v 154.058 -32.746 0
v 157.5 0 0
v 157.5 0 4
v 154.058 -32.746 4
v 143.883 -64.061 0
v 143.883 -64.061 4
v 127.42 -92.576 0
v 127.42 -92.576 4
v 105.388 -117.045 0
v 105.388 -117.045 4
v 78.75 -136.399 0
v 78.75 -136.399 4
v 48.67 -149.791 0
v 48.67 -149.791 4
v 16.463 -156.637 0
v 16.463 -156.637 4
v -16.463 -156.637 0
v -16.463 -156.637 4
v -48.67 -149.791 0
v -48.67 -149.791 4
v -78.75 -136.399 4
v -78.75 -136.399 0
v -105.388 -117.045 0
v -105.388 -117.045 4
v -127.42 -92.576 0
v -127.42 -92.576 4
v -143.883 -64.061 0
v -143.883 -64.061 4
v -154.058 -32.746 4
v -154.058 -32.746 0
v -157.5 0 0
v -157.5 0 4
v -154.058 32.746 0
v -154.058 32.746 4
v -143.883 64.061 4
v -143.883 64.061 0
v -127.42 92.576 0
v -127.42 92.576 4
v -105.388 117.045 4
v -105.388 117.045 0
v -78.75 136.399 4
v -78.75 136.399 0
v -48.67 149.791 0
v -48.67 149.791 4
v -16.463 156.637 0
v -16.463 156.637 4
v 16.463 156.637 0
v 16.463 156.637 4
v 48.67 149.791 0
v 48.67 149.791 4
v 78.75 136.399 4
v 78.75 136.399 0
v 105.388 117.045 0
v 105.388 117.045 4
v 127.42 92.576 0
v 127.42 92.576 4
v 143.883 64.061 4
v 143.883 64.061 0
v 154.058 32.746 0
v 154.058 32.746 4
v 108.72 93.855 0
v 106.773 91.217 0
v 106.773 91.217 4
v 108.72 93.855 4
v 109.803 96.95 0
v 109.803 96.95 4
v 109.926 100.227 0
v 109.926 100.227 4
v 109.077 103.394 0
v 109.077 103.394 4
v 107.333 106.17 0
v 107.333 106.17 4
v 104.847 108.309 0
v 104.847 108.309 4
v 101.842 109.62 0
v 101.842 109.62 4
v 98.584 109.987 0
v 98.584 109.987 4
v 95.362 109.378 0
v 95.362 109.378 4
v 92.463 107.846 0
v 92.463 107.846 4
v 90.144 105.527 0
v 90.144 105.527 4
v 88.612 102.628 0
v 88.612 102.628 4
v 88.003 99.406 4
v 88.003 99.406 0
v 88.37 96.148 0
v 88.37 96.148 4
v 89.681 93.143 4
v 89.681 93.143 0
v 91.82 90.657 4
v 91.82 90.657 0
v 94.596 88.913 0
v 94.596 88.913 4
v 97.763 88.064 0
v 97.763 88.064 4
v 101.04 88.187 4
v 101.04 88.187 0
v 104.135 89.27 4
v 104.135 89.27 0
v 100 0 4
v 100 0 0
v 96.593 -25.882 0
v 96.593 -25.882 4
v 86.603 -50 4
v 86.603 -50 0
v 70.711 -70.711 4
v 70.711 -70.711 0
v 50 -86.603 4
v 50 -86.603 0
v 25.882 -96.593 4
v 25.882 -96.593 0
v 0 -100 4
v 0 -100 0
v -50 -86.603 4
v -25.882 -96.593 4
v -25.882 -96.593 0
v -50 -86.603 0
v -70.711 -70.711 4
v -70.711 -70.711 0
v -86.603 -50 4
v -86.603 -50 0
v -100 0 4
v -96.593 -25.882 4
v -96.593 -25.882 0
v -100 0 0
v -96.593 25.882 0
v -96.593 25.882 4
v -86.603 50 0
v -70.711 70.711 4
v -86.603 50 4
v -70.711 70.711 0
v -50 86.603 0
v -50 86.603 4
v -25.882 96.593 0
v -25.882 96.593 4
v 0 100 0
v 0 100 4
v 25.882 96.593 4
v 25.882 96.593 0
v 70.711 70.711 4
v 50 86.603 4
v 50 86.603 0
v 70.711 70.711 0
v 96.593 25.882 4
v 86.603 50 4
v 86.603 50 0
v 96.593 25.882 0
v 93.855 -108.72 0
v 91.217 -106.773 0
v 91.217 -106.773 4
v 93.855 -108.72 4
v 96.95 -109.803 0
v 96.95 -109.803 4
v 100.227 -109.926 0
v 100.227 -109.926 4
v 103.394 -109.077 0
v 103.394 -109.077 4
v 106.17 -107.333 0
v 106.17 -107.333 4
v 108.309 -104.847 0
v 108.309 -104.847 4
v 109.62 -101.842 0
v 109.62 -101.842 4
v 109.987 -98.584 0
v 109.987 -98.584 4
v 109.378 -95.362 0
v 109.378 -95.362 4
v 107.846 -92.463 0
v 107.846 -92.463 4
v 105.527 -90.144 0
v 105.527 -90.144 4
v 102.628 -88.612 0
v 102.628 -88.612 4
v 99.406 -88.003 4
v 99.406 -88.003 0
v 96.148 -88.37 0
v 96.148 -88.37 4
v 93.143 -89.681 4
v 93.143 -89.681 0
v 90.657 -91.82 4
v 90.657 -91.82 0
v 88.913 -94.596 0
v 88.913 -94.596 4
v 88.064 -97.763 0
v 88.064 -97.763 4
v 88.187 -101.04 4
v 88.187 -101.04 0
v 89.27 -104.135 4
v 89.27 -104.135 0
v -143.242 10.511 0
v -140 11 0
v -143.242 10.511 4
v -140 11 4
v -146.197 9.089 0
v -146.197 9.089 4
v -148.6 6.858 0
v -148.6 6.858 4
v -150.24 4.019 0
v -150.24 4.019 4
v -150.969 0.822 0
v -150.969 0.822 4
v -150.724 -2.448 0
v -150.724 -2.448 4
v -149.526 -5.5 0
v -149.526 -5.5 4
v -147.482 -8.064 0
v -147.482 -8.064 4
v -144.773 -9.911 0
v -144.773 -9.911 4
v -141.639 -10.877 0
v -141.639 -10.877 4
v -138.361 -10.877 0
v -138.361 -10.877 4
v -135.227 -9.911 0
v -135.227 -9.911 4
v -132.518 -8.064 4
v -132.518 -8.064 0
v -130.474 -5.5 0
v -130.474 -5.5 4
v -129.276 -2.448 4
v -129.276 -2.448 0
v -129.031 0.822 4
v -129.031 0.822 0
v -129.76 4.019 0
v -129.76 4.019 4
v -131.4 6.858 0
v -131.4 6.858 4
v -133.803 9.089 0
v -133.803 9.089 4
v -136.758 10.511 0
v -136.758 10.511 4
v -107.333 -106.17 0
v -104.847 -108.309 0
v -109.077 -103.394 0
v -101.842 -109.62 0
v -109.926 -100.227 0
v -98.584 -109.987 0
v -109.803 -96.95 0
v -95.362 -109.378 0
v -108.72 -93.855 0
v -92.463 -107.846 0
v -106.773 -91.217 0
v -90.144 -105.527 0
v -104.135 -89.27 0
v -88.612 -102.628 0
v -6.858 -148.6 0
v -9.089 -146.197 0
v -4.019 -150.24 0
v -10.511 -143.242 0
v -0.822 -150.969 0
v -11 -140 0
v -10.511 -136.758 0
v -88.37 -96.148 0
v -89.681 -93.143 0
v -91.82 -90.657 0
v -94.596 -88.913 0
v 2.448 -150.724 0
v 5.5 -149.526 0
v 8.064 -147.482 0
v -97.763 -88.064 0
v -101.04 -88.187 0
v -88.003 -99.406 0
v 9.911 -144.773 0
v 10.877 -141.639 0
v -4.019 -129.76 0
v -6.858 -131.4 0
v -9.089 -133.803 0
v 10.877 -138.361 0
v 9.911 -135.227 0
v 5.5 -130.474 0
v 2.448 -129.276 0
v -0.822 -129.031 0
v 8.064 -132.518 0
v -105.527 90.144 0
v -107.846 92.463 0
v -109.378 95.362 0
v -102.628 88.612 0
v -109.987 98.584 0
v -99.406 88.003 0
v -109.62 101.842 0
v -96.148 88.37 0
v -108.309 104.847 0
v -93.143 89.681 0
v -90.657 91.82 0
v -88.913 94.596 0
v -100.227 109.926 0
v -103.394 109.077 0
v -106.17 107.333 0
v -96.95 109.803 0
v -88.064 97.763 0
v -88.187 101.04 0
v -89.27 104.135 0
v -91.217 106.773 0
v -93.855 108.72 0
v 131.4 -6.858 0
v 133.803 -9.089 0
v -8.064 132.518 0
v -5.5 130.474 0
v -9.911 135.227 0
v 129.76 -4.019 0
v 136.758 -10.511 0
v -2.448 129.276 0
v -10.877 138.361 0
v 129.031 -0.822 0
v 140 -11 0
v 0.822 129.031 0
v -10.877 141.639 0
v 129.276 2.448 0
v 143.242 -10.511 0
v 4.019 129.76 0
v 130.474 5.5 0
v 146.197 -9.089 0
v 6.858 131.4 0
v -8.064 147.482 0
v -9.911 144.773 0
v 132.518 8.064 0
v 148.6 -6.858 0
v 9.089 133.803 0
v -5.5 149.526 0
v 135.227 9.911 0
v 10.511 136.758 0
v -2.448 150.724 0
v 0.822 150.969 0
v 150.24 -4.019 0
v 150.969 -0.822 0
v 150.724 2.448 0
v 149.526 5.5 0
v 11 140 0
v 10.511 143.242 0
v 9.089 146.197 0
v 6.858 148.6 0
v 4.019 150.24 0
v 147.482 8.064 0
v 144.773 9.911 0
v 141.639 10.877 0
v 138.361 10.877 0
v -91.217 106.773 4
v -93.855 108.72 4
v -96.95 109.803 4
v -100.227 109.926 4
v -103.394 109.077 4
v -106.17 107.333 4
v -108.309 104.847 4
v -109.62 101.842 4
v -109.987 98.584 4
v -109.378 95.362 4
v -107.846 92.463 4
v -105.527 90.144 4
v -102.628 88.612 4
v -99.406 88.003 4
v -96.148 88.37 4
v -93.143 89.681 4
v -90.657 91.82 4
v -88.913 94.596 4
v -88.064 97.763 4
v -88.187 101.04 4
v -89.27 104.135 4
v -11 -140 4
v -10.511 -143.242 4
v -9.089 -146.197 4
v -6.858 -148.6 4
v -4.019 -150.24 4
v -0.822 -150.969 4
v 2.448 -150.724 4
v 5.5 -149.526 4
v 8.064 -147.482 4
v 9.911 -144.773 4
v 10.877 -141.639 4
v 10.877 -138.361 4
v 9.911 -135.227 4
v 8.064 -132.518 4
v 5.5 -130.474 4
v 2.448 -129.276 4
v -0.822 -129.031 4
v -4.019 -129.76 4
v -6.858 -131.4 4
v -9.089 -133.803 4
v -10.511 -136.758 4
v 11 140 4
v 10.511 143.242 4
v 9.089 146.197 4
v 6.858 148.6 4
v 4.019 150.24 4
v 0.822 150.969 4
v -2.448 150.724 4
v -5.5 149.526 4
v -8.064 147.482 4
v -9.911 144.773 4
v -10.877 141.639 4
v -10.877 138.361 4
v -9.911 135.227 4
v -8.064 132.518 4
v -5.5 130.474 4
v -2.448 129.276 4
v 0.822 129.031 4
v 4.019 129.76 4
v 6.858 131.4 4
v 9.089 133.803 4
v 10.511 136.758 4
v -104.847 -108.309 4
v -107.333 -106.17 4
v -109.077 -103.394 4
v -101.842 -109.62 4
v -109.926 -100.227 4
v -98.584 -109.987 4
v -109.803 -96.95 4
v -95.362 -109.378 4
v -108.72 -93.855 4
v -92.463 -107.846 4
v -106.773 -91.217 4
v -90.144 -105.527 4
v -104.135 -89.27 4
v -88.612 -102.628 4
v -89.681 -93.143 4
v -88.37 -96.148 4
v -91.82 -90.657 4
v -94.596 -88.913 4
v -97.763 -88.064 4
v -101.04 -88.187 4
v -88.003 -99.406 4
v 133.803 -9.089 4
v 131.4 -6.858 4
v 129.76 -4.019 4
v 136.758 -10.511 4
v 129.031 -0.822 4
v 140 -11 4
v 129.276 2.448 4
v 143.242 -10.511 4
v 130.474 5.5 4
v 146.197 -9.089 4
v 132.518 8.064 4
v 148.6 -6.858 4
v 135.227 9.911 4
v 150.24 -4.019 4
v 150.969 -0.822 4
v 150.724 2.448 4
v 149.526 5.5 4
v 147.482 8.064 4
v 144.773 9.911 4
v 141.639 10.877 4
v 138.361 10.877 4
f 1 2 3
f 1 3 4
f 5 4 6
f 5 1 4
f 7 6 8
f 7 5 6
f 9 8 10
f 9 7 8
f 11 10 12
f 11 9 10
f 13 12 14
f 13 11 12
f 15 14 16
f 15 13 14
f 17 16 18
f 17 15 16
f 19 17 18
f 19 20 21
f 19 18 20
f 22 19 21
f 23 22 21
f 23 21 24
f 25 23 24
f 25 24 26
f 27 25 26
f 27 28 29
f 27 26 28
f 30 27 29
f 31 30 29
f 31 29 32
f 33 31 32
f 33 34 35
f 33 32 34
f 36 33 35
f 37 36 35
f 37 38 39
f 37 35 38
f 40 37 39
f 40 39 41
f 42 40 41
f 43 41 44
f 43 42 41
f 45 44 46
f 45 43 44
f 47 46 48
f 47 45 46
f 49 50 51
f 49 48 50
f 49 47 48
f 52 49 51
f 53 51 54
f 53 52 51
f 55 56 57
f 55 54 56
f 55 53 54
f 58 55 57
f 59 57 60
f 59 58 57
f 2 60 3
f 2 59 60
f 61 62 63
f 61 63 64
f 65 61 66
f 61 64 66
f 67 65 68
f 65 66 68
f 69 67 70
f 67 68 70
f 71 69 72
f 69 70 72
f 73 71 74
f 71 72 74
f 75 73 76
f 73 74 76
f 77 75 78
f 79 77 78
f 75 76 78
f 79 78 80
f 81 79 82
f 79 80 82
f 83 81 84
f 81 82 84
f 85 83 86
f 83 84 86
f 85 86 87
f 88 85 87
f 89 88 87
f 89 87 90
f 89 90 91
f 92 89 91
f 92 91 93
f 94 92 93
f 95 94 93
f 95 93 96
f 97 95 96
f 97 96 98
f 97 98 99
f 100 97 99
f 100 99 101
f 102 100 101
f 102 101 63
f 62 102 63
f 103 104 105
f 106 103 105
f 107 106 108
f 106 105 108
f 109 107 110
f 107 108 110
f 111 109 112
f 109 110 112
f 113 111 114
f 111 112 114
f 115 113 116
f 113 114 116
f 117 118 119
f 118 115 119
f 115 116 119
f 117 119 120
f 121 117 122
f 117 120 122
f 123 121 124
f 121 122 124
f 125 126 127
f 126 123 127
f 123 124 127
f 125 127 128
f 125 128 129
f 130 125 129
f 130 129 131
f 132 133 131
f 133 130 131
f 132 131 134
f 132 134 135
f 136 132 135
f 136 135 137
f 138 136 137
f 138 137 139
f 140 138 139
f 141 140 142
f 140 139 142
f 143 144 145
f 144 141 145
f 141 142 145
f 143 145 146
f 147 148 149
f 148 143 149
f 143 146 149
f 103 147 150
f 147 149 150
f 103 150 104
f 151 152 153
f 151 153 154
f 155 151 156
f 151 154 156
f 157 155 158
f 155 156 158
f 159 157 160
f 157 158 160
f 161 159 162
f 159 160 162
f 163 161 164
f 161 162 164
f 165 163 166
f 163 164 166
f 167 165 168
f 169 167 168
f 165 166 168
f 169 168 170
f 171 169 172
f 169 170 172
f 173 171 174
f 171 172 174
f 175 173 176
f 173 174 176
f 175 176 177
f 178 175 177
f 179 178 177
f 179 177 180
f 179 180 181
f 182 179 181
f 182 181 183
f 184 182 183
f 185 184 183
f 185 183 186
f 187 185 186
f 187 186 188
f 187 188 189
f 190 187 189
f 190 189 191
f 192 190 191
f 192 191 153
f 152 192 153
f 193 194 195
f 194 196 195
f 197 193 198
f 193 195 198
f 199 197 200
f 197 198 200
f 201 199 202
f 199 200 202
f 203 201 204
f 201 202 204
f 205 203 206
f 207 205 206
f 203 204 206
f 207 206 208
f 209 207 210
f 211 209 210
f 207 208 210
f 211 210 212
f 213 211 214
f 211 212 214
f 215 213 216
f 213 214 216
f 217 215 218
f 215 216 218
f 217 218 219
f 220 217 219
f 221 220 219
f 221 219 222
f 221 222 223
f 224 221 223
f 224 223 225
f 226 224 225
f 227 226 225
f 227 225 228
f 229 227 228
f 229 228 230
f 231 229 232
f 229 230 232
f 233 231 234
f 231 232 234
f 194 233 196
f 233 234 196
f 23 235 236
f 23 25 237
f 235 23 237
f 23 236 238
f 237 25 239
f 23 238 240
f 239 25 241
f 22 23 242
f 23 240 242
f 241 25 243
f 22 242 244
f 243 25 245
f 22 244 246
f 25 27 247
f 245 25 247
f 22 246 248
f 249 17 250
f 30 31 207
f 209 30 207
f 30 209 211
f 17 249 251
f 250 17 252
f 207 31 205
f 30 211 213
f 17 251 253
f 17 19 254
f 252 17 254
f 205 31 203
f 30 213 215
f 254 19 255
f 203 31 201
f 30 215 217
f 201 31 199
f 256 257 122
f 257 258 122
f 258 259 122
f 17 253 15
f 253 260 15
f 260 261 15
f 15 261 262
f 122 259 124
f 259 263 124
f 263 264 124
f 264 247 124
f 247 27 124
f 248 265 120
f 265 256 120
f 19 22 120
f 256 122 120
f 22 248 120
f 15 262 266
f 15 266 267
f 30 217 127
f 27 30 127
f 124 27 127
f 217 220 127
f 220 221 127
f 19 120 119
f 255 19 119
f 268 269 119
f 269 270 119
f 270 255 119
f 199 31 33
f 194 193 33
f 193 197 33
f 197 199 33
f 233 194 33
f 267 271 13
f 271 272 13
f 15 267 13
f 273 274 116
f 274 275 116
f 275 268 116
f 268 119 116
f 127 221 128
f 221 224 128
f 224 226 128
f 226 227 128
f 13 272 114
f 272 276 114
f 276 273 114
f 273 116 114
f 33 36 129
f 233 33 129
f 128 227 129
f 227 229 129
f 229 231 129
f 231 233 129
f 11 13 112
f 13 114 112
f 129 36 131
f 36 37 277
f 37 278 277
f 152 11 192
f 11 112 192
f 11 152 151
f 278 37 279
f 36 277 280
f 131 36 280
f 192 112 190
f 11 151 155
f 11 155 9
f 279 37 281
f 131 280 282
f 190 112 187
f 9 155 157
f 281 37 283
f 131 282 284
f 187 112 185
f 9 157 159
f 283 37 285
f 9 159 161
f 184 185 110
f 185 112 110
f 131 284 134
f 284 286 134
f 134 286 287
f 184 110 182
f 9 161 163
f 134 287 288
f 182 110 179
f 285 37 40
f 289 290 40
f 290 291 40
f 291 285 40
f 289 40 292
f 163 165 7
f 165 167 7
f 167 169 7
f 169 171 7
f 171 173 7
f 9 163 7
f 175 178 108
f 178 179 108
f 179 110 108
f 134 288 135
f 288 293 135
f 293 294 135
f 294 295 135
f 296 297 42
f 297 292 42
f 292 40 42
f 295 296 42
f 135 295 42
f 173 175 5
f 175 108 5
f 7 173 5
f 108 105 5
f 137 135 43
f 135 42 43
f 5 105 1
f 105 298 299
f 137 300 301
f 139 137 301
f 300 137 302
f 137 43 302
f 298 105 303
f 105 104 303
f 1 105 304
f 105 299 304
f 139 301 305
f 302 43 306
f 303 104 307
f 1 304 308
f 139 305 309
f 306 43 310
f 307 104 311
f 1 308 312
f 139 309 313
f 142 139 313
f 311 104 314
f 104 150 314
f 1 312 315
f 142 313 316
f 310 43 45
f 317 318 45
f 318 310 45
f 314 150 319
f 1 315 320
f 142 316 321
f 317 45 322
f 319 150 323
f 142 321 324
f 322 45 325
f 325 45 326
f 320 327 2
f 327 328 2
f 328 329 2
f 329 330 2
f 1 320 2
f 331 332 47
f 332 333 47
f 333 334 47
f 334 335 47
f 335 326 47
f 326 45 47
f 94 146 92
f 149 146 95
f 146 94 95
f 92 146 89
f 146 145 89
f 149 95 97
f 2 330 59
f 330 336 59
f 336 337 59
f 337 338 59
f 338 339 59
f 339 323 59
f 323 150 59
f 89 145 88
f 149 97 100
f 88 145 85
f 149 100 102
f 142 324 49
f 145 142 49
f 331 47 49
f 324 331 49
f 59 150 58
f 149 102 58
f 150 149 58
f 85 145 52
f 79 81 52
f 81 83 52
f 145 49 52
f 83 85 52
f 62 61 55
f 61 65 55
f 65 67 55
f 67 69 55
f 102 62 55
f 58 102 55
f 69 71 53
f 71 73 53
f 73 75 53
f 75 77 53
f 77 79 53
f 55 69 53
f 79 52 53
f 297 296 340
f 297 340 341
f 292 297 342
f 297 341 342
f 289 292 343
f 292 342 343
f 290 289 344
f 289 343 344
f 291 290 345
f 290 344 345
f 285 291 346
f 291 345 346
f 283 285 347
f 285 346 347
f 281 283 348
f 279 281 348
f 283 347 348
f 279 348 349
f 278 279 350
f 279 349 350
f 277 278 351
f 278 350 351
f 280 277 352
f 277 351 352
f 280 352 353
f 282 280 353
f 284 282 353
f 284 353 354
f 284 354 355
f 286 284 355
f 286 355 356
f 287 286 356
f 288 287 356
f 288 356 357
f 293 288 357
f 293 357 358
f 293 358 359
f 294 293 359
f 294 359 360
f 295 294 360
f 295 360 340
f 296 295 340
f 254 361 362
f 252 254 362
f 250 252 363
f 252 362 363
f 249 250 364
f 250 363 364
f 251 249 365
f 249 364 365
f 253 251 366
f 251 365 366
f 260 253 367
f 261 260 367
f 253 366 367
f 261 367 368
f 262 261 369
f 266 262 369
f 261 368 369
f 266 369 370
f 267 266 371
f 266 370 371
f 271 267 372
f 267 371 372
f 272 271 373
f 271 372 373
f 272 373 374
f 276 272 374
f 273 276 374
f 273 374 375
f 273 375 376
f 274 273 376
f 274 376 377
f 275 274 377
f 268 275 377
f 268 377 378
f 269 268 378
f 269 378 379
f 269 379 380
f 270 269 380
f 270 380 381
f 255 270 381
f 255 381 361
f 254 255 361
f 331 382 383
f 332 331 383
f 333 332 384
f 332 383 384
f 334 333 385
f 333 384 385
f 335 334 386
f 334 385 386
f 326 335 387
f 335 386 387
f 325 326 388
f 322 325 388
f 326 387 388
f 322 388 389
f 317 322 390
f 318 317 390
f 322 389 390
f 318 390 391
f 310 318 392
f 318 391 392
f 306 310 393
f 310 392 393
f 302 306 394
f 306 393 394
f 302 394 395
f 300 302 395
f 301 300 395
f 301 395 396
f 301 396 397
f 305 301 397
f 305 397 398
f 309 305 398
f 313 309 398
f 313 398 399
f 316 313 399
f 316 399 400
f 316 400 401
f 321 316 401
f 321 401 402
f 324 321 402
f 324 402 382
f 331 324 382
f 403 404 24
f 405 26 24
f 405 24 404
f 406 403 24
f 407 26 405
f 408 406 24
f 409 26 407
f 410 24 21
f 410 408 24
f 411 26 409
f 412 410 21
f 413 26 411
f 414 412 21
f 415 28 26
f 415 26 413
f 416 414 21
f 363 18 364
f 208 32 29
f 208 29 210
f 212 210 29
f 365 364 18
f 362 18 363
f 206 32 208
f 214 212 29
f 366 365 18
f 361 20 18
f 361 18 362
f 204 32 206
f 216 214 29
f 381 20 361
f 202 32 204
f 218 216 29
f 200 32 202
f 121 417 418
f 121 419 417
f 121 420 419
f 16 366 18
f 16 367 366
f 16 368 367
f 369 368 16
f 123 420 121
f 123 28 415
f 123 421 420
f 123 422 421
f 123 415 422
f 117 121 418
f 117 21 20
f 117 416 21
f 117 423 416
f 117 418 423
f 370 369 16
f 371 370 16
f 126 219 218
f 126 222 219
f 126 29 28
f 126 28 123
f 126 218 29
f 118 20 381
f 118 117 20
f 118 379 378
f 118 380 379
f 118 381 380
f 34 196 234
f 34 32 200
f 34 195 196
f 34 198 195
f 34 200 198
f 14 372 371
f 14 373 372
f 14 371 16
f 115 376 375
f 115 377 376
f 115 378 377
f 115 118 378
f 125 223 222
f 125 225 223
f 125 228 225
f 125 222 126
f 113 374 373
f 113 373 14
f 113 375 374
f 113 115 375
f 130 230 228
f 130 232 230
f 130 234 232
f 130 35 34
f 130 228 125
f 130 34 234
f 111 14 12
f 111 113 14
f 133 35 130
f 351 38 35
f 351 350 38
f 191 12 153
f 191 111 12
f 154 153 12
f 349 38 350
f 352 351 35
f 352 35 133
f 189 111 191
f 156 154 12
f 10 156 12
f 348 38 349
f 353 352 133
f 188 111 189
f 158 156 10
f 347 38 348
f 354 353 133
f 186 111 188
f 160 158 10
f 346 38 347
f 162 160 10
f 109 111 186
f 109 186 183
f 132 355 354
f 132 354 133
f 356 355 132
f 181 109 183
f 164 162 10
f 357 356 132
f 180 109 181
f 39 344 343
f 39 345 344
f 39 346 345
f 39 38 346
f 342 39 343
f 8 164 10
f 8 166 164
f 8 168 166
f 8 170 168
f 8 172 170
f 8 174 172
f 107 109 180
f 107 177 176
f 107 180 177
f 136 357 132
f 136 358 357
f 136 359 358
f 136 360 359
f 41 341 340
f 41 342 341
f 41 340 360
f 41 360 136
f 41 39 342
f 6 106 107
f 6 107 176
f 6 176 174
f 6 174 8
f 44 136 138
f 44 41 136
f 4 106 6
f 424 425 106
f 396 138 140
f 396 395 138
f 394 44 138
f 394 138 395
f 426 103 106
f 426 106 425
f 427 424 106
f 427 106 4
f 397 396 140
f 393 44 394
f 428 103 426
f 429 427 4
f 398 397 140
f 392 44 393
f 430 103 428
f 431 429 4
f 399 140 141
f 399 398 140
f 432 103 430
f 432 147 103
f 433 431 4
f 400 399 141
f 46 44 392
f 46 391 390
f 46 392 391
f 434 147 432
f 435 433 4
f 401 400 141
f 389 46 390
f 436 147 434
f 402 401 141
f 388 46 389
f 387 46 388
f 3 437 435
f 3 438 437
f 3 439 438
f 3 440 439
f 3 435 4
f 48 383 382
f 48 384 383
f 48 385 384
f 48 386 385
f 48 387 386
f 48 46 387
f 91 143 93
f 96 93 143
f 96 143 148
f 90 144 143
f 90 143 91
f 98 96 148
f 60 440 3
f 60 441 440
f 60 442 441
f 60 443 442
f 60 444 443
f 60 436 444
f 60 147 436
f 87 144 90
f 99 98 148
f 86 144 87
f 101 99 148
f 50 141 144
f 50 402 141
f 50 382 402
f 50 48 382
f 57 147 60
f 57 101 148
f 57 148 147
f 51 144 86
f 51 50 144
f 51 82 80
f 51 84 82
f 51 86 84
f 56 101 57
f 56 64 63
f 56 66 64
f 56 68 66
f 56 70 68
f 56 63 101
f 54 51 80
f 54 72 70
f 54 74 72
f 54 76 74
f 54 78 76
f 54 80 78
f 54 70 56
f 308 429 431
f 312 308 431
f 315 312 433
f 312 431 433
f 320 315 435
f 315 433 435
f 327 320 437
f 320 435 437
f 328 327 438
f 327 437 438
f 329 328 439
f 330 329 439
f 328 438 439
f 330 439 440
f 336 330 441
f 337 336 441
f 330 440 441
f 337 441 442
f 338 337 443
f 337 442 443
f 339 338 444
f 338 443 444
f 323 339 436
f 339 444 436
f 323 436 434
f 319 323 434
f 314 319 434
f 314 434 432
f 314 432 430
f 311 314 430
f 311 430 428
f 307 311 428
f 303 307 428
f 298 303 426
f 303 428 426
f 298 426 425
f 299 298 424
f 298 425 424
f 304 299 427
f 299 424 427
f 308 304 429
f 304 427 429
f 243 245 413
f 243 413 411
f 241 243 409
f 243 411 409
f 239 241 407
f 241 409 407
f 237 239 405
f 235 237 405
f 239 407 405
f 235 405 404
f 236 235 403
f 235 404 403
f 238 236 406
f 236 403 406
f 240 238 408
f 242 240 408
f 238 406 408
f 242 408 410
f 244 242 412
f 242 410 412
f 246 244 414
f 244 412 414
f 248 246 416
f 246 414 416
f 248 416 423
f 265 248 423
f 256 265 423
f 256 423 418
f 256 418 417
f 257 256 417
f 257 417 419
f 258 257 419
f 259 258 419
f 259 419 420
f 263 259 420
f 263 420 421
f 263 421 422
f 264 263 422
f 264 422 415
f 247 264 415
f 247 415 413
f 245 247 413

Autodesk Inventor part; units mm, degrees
ref_plane "YZ Plane" through (0, 0, 0) normal (1, 0, 0) x (0, 1, 0)
ref_plane "XZ Plane" through (0, 0, 0) normal (0, 1, 0) x (-1, 0, 0)
ref_plane "XY Plane" through (0, 0, 0) normal (0, 0, 1) x (1, 0, 0)
sketch "Sketch1" plane through (0, 0, 0) normal (0, 0, 1) x (1, 0, 0)
  circle A0 centre (0, 0) radius 100
  circle A1 centre (0, 0) radius 157.5
  dimension "d22" = 200
  dimension "d23" = 315
extrude "Plate1" add sketch "Sketch1" along normal blind 4
sketch "Sketch5" plane through (0, 0, 4) normal (0, 0, 1) x (1, 0, 0)
  circle A0 centre (0, 140) radius 11
  circle A1 centre (0, 0) radius 140 construction
  dimension "d25" = 280
  dimension "d24" = 22
extrude "Cut1" cut sketch "Sketch5" against normal blind 4
pattern_circular "Circular Pattern1" count 8 over 360 about axis through (0, 0, 0) along (0, 0, 1) of "Cut1"
equation "\"d26\" = Thickness"
equation "\"d2\" = Thickness"
equation "\"BendReliefWidth\" = Thickness"
equation "\"BendReliefDepth\" = 0.5 * Thickness"
equation "\"CornerReliefSize\" = 4 * Thickness"
equation "\"MinimumRemnant\" = 2 * Thickness"
equation "\"TransitionRadius\" = BendRadius"
equation "\"JacobiRadiusSize\" = BendRadius"
equation "\"GapSize\" = Thickness"
equation "\"Thickness\" = 4"
equation "\"BendRadius\" = 5"
properties part number "ANP 1411 BOTTOM DS main flange" material "Stainless Steel"
